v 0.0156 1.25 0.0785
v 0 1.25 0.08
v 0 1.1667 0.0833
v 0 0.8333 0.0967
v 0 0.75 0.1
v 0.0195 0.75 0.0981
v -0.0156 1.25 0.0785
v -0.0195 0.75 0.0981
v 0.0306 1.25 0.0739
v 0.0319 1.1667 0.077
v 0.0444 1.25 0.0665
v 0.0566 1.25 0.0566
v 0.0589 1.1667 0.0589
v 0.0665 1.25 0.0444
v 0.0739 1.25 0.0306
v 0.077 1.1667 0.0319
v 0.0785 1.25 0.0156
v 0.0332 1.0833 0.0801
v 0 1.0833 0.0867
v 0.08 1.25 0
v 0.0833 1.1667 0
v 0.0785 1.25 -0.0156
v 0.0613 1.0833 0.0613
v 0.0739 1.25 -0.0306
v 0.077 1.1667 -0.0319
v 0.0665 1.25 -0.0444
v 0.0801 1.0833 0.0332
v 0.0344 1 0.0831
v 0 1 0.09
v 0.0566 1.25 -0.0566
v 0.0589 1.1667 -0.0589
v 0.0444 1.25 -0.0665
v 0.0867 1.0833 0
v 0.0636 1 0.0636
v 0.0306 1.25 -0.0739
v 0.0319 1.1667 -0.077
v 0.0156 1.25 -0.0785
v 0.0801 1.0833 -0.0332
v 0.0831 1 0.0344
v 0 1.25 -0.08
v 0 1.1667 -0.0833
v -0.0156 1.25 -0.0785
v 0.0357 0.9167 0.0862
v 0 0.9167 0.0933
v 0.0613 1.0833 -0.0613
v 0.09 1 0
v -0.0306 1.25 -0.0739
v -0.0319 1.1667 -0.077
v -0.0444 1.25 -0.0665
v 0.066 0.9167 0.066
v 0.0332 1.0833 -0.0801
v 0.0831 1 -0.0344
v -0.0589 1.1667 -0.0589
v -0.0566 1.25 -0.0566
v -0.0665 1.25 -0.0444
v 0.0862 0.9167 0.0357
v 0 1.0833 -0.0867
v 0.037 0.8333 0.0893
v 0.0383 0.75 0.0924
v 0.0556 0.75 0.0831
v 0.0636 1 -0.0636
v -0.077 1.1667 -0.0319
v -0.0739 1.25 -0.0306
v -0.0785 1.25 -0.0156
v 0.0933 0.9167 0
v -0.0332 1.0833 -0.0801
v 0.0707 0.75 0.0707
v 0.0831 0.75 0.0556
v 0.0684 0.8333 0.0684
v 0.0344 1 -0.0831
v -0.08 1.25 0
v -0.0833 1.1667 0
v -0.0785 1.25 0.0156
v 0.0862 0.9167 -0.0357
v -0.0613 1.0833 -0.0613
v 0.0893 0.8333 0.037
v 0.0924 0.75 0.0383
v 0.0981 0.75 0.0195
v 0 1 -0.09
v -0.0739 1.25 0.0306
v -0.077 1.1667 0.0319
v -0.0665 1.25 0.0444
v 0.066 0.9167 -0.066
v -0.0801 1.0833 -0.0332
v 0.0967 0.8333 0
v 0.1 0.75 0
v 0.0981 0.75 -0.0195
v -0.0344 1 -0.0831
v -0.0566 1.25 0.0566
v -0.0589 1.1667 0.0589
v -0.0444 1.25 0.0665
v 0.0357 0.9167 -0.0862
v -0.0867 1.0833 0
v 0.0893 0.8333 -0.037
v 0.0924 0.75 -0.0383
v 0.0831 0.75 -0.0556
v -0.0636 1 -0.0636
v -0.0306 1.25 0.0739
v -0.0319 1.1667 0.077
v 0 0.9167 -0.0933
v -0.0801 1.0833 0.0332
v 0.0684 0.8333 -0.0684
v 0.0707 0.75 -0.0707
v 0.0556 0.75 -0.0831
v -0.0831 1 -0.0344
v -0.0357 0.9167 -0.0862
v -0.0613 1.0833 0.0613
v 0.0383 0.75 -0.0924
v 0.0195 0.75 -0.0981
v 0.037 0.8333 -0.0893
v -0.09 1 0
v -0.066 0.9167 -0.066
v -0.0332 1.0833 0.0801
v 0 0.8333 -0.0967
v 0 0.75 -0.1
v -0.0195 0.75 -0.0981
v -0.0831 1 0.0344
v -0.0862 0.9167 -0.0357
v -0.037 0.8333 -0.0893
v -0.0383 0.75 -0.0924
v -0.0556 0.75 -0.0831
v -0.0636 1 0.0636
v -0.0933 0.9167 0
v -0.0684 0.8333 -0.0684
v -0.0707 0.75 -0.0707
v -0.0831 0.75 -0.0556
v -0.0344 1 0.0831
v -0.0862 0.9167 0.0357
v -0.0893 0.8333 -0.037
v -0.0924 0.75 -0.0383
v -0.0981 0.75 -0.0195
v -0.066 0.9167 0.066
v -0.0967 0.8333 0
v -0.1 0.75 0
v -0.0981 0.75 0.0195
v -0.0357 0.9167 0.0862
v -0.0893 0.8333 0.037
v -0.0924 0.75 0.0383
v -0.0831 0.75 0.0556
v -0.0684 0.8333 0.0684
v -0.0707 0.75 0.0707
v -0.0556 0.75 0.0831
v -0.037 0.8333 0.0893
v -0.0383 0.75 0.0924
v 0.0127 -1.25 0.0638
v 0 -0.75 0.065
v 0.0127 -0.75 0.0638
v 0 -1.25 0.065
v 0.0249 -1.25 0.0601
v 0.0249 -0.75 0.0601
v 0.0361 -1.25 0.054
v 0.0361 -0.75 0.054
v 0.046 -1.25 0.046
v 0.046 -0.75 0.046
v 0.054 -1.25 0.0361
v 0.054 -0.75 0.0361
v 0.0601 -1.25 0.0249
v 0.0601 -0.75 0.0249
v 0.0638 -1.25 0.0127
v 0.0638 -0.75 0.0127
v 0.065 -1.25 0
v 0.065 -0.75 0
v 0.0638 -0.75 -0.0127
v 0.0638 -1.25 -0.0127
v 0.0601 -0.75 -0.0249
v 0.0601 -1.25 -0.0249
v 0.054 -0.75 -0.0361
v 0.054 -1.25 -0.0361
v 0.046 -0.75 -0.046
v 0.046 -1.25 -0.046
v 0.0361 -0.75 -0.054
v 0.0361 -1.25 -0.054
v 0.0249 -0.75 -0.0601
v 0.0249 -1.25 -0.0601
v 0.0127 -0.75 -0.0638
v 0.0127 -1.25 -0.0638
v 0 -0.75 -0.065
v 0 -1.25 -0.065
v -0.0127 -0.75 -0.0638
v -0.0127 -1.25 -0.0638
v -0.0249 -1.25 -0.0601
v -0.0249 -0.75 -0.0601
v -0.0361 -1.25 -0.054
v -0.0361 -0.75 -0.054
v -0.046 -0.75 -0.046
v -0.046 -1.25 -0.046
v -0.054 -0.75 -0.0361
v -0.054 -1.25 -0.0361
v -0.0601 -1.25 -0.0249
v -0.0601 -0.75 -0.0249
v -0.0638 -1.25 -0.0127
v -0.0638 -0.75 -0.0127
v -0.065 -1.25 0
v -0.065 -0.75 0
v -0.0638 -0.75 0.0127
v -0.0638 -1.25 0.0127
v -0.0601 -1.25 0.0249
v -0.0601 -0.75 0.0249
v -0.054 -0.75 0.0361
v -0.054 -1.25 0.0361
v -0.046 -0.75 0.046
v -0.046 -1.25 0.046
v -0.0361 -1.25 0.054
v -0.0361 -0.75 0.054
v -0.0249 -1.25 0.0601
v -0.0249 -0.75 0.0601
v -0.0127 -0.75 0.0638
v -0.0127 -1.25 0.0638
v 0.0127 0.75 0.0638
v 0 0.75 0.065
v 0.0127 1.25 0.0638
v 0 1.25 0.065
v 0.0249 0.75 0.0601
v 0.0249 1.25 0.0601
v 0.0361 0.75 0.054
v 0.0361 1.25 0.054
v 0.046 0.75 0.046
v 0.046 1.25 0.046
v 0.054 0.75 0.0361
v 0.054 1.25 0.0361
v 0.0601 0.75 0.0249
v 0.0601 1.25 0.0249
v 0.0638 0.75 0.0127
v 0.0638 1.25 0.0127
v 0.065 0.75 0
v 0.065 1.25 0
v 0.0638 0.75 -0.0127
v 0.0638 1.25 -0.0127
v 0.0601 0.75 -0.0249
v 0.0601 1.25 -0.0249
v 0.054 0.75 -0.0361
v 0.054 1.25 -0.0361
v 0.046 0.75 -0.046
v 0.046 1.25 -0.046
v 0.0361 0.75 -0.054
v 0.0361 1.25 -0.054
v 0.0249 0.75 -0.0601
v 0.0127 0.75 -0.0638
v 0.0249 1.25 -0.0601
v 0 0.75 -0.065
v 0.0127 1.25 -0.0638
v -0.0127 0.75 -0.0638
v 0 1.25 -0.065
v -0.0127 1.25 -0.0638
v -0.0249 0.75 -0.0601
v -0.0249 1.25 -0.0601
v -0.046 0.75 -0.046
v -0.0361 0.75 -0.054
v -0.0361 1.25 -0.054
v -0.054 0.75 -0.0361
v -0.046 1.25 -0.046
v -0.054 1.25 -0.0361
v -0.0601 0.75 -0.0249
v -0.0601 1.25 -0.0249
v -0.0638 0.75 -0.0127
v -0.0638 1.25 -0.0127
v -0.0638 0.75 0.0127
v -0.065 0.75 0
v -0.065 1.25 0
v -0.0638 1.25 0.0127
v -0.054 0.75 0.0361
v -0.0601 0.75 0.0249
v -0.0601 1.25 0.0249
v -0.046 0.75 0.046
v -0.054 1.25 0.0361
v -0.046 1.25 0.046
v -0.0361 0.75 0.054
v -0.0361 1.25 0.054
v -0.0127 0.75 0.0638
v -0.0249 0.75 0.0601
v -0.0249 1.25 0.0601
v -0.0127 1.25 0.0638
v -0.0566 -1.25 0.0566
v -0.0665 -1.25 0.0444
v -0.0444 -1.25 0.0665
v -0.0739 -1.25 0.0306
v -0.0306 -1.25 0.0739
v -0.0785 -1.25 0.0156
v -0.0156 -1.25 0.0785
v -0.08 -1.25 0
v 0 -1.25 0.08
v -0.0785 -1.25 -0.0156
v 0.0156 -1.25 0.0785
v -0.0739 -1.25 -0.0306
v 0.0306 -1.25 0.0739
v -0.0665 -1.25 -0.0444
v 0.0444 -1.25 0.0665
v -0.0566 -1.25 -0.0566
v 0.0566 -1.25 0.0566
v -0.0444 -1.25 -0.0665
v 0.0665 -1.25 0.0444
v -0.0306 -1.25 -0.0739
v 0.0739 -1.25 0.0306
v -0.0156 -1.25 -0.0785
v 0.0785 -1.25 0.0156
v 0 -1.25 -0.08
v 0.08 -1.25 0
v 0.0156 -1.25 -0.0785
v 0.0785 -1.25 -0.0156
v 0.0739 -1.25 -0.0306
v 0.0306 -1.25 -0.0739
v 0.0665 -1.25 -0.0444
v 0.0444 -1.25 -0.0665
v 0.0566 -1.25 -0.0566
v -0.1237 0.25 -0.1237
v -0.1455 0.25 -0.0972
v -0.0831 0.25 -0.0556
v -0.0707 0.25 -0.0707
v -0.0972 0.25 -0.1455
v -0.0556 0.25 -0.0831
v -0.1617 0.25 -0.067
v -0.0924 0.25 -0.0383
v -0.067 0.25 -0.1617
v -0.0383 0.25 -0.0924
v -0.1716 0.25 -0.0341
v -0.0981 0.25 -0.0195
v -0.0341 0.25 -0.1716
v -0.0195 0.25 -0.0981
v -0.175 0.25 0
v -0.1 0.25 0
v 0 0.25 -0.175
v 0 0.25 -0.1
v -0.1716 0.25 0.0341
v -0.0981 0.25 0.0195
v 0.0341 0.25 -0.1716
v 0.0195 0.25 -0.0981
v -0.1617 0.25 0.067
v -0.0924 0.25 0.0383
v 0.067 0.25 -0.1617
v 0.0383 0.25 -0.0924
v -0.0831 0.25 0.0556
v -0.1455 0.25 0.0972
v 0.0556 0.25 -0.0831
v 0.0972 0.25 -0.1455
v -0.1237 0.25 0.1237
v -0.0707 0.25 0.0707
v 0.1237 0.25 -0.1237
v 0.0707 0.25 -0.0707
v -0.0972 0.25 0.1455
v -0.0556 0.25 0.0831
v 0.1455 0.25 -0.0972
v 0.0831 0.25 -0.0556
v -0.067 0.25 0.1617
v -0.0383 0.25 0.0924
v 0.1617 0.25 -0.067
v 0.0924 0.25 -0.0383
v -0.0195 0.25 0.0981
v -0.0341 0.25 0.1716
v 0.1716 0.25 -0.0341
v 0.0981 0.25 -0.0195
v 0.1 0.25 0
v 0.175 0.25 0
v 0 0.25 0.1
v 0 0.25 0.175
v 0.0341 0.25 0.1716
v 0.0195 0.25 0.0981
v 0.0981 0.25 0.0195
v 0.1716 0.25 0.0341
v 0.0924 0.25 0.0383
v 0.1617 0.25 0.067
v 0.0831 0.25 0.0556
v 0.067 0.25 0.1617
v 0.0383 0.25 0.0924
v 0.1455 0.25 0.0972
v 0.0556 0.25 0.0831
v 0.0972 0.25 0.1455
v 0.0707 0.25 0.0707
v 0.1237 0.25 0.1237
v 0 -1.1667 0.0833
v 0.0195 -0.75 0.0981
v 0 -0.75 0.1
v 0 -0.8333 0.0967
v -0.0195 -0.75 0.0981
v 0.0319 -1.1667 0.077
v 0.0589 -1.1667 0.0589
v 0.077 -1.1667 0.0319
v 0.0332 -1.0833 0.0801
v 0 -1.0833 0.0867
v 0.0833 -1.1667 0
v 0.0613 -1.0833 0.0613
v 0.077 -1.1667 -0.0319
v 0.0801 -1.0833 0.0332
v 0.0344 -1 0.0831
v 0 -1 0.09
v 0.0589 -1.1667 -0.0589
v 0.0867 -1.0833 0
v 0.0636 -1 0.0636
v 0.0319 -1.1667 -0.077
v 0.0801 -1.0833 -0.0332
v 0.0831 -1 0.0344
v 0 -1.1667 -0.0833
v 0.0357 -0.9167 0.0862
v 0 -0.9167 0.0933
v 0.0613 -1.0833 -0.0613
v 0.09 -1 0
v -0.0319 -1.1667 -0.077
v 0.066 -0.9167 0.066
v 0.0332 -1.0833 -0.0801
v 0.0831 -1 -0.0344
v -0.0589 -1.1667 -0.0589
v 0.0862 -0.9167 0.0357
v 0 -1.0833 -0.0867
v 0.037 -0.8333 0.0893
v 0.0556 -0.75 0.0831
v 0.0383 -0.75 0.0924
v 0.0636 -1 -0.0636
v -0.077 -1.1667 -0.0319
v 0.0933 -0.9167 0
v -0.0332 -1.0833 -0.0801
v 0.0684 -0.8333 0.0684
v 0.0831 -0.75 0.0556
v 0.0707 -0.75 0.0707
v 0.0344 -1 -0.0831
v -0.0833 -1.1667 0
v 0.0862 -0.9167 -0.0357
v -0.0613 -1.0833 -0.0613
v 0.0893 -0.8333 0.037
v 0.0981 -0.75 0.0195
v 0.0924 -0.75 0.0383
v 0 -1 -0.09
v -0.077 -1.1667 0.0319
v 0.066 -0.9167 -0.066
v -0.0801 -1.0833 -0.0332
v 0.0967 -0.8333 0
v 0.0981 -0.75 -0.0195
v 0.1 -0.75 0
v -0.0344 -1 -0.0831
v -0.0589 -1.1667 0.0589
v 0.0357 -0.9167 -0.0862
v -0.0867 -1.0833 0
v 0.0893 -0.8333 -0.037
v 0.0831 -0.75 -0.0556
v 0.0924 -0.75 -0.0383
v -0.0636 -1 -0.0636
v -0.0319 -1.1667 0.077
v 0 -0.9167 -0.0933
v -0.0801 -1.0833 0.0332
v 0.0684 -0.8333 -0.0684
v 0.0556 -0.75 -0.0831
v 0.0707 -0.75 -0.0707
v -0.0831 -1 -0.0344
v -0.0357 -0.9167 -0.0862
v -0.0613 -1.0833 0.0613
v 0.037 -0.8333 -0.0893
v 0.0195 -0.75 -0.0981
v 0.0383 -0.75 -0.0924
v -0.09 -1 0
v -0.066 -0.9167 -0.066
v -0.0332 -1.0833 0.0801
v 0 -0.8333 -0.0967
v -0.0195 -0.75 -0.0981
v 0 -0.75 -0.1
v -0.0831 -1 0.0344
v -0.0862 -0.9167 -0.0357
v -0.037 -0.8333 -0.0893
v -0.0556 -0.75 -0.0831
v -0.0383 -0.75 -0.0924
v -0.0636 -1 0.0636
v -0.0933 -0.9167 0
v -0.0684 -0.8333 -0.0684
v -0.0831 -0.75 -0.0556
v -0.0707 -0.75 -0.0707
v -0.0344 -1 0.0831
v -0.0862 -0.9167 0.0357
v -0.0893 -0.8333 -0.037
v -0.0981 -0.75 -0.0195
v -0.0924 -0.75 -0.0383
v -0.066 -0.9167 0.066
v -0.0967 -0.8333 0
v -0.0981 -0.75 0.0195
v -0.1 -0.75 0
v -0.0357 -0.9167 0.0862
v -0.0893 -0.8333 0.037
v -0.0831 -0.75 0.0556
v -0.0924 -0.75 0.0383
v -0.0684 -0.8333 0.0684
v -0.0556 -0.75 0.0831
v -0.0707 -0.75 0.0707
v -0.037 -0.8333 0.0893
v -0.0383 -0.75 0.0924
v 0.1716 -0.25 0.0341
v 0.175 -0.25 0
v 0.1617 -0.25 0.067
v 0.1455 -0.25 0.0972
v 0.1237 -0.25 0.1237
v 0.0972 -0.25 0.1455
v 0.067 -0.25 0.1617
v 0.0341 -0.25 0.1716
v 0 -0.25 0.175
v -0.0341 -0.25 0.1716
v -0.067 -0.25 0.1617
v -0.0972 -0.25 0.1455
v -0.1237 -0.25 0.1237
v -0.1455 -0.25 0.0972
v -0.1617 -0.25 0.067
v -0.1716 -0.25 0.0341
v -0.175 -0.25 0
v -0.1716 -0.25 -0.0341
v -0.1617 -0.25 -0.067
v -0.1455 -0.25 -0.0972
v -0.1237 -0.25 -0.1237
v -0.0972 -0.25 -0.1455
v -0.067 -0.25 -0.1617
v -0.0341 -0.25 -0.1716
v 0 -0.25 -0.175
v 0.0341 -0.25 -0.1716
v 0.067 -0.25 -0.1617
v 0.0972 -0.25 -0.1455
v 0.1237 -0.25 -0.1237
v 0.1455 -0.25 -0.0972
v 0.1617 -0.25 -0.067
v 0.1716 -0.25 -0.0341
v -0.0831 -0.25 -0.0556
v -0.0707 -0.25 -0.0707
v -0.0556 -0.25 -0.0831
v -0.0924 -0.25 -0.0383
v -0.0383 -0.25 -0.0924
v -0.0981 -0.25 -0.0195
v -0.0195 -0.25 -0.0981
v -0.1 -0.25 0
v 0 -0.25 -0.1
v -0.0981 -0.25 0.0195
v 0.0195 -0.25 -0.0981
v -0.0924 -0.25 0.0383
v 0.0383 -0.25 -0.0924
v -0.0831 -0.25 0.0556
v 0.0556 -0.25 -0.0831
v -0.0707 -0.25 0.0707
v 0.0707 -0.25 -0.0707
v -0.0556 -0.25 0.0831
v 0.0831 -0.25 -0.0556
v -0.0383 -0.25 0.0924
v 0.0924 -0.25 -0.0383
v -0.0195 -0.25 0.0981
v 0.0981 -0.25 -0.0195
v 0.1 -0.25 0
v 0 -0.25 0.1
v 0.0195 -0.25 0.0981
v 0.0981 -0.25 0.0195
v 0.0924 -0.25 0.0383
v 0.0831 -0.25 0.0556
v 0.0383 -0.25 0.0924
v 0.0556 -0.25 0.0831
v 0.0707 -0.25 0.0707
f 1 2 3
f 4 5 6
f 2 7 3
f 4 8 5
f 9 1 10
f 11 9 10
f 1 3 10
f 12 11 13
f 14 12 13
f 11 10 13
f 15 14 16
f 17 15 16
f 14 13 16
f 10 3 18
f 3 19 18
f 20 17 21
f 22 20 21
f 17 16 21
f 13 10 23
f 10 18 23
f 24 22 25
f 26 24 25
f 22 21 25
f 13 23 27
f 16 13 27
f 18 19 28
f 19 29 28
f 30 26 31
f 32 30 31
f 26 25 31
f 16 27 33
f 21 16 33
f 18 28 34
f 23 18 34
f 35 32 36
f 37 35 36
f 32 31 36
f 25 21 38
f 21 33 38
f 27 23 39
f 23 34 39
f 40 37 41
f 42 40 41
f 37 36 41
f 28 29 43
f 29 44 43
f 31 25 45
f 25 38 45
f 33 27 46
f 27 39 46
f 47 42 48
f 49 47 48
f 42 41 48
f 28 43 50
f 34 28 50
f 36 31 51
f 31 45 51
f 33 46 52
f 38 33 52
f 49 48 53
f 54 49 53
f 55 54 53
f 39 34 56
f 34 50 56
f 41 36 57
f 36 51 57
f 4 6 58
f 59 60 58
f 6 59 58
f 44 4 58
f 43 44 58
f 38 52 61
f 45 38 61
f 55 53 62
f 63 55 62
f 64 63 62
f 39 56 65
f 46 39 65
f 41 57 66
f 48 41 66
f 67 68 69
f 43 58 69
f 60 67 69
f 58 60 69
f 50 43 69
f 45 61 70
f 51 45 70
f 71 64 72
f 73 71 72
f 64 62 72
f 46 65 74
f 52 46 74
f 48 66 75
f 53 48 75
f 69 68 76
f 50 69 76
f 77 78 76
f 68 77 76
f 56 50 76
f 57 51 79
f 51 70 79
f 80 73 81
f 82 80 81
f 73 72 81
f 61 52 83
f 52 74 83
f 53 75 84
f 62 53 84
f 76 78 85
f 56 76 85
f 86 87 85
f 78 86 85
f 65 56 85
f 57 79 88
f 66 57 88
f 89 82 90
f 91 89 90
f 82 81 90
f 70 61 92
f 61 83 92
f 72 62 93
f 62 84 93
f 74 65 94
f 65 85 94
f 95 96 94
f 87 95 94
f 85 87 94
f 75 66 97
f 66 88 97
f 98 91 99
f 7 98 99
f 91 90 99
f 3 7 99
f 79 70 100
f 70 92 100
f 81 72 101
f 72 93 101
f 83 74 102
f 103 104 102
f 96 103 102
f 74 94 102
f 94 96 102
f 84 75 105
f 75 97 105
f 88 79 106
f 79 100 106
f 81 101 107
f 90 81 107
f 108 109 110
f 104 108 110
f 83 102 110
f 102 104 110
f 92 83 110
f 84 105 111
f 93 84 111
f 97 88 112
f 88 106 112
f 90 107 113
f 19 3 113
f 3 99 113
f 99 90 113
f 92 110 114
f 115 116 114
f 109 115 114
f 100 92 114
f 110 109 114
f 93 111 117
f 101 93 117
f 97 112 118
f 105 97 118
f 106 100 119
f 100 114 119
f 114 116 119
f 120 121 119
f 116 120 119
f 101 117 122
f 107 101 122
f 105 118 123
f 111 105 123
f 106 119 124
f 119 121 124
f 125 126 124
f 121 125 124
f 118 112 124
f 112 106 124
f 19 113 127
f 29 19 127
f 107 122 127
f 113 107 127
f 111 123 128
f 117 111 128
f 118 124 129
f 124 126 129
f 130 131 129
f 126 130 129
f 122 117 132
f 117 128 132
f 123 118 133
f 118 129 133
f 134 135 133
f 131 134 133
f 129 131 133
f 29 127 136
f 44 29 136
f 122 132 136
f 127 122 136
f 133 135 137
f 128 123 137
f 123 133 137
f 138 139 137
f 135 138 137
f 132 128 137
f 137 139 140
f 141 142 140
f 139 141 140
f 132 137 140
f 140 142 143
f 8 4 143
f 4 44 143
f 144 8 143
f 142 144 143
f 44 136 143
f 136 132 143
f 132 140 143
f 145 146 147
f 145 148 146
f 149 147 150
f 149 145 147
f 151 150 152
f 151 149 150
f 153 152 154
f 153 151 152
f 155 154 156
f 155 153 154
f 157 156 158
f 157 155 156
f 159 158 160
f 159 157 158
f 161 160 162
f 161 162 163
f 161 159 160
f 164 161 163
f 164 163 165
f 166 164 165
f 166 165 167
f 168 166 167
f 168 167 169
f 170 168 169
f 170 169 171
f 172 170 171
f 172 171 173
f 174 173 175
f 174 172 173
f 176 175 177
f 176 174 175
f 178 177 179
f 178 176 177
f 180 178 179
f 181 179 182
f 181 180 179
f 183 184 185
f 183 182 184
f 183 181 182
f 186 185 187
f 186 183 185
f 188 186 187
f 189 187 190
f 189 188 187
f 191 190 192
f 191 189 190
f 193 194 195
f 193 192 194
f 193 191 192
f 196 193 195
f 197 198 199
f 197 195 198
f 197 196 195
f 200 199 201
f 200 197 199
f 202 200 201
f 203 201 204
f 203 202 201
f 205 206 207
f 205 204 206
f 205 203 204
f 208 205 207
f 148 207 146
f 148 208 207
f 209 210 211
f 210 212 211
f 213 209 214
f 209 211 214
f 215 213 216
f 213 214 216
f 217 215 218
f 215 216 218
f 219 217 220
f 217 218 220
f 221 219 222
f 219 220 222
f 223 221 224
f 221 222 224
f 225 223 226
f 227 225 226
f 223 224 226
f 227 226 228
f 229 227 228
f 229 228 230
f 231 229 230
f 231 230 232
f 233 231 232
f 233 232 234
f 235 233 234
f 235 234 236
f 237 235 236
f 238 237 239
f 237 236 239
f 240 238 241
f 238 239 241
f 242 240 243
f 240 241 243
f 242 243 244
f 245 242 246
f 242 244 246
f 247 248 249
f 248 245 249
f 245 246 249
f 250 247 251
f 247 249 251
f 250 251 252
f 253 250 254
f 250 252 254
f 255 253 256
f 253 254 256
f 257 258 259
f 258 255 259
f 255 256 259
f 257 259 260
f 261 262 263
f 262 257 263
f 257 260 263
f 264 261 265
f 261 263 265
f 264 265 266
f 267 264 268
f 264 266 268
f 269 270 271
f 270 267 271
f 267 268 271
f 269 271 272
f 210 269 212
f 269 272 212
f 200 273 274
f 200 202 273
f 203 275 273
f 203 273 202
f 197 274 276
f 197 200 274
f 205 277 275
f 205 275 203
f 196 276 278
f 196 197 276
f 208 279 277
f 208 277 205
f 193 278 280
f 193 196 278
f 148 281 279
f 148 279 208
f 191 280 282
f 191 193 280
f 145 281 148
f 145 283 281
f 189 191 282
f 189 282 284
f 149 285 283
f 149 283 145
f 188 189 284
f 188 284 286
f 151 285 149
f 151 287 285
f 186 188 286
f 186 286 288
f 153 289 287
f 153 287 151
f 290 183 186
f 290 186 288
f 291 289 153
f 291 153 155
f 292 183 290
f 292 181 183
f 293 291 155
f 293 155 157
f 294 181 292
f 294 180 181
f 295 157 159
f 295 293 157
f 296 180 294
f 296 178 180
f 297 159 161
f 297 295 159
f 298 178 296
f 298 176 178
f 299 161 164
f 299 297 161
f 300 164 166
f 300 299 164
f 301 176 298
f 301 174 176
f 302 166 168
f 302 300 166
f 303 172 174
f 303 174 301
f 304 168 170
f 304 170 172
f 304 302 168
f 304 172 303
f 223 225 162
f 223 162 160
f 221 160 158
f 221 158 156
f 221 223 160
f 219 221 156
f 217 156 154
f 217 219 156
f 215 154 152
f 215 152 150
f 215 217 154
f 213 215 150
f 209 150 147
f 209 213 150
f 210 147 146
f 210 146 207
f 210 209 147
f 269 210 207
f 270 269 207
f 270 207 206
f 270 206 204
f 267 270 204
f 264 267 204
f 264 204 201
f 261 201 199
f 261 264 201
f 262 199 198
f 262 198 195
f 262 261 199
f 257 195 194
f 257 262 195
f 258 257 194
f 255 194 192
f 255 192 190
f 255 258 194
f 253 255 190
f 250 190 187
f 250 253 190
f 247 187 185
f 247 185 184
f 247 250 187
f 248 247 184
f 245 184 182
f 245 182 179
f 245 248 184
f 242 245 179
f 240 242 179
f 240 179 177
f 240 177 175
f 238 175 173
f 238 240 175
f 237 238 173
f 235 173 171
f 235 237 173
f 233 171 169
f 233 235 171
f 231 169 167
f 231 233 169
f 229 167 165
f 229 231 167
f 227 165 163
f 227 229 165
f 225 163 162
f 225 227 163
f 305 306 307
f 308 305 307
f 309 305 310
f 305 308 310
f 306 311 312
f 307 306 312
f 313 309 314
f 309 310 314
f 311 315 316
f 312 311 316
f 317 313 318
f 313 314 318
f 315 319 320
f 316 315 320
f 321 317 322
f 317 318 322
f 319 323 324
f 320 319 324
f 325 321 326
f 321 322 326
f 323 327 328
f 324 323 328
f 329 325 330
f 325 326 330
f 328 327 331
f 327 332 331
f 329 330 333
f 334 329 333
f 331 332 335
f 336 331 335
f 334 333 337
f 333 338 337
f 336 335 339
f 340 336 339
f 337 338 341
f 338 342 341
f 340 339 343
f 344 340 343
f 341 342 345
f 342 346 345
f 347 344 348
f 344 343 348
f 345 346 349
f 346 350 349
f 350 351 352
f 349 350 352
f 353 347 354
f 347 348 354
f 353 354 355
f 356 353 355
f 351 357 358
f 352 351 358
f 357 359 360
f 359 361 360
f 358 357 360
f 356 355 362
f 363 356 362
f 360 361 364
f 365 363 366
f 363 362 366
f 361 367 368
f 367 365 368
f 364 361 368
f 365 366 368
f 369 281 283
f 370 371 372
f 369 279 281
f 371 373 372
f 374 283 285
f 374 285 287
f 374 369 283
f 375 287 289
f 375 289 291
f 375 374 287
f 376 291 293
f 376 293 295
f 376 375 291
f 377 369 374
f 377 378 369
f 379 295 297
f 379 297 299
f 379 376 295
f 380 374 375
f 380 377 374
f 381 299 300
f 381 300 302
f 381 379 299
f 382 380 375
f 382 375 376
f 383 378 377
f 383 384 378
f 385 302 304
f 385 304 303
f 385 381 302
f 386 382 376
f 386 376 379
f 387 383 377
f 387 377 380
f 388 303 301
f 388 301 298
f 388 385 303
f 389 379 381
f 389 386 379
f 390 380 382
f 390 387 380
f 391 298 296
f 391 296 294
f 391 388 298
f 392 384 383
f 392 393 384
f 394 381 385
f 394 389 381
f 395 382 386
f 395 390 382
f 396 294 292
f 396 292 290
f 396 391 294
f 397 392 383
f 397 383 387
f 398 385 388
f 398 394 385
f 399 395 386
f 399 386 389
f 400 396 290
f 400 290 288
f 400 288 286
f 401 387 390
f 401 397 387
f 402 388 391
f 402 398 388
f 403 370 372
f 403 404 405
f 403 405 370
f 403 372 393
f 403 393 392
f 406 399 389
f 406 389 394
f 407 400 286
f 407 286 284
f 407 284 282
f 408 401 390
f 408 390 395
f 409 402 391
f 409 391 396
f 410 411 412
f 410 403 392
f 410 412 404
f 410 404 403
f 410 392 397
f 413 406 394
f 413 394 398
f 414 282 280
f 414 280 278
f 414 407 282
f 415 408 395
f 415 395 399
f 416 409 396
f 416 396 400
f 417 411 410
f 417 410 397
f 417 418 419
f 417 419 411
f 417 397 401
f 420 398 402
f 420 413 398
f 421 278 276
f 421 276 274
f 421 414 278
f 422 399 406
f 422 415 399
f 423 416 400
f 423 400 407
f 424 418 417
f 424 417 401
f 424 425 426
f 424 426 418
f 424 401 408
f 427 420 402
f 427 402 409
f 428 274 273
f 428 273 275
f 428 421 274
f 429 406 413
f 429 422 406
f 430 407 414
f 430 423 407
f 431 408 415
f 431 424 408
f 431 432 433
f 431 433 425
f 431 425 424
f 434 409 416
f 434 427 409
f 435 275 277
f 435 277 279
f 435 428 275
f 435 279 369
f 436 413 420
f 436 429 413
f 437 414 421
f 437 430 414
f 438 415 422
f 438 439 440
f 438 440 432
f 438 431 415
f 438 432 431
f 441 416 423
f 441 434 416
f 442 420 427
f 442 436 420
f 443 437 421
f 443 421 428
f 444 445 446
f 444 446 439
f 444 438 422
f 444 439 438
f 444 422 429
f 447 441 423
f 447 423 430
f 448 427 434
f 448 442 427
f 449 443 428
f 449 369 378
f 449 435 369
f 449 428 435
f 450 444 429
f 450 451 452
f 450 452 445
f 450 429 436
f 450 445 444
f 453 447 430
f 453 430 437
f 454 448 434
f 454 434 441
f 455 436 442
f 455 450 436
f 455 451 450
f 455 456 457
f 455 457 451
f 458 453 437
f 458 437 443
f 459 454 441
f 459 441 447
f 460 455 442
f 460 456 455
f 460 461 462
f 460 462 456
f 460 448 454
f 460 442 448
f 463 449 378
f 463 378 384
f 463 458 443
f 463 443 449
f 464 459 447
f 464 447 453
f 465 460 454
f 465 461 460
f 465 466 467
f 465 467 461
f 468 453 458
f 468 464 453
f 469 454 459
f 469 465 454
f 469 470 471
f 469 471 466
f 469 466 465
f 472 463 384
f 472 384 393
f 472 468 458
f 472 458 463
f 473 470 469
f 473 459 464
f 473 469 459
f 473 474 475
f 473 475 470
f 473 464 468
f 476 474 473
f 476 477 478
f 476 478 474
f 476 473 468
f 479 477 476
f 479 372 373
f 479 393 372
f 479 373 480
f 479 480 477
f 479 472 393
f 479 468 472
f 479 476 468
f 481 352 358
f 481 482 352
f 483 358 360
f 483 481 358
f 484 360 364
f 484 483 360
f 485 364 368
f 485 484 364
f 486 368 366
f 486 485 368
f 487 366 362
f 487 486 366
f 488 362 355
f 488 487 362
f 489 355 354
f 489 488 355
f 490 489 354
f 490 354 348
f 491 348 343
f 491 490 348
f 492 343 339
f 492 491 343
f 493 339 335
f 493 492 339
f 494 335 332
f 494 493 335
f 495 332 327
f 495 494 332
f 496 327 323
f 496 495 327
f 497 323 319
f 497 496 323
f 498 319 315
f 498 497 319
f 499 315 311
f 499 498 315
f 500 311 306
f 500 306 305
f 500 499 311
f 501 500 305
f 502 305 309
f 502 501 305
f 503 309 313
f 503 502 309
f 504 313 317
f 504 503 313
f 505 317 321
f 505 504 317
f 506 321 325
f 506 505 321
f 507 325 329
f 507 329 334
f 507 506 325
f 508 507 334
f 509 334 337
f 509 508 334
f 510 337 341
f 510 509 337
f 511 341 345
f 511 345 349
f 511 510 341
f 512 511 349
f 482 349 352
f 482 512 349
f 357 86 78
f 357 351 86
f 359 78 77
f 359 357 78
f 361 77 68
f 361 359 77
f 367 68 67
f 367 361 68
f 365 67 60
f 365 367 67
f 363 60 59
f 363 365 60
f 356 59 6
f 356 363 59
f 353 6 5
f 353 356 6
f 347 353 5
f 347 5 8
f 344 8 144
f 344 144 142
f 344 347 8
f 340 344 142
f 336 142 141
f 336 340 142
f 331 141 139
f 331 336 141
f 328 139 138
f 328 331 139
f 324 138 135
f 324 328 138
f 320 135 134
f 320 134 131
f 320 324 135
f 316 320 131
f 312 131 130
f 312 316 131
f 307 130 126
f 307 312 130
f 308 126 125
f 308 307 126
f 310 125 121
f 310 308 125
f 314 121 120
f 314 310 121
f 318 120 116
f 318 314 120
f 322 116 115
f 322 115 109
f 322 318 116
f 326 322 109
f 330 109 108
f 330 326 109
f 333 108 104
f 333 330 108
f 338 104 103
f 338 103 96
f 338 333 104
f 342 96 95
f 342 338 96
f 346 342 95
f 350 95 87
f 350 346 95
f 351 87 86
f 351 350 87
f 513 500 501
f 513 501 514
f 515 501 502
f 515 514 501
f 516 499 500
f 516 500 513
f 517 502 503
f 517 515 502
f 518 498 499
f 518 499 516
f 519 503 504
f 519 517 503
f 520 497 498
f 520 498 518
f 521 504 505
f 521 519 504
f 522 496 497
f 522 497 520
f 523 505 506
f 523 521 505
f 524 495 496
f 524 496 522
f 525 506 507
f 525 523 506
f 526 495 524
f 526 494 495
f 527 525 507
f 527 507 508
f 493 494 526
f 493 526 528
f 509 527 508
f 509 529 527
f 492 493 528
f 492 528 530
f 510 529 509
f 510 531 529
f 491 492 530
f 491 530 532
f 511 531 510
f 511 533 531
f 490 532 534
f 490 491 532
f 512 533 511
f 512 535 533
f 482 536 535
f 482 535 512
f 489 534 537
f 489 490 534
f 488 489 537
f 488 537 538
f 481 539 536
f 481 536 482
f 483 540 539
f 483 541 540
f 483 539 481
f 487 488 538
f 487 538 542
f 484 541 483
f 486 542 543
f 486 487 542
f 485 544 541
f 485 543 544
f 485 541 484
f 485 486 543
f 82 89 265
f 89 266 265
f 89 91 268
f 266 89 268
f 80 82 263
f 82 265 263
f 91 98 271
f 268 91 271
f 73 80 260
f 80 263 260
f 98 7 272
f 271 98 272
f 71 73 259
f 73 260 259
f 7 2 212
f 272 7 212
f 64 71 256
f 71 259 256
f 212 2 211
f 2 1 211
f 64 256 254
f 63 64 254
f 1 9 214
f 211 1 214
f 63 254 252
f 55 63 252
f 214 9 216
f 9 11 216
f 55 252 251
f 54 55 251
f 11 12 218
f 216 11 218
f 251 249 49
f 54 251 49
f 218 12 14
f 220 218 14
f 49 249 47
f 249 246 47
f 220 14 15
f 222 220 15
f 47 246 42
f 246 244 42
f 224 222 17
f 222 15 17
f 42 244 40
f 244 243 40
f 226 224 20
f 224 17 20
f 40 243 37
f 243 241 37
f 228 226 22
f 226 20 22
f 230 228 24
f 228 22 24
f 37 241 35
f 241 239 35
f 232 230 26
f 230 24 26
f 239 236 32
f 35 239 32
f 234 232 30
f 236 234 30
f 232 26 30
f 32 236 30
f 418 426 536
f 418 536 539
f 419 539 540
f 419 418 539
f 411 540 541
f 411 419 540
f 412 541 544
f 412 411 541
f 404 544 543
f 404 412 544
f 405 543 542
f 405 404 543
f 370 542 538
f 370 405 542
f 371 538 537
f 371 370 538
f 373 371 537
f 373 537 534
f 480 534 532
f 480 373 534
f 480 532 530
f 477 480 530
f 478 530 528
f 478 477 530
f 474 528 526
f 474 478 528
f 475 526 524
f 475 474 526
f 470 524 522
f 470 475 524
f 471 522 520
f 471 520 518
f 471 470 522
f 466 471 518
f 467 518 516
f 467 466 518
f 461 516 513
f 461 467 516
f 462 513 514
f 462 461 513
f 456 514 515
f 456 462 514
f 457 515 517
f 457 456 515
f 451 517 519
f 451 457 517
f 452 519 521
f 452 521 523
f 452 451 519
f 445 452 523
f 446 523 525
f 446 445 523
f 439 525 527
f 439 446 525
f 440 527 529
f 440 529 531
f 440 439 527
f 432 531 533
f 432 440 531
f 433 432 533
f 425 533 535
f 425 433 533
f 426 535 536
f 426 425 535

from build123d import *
from build123d import SkipClean  # not in build123d's __all__

# Parameters (mm, degrees)
F0_R     = 0.175
F0_R_2   = 0.1
F0_R_3   = 0.065
F1_DEPTH = 0.25
F2_DEPTH = 0.75


with BuildPart() as f1:
    # F0 (on Front) → F1 (new body, symmetric)
    with BuildSketch(Plane.XZ):
        Circle(F0_R)
        Circle(F0_R_2, mode=Mode.SUBTRACT)
        Circle(F0_R_2)
        Circle(F0_R_3, mode=Mode.SUBTRACT)
    extrude(amount=F1_DEPTH, both=True)

    # F0 (on Front) → F2 (join, symmetric)
    with BuildSketch(Plane.XZ):
        Circle(F0_R_2)
        Circle(F0_R_3, mode=Mode.SUBTRACT)
    extrude(amount=F2_DEPTH, both=True)

    # F3 (on Right) → F4 (revolve)
    with BuildSketch(Plane.YZ):
        Polygon((0.75, 0.065), (1.25, 0.065), (1.25, 0.08), (0.75, 0.1), align=None)
    with SkipClean():  # cleaning this boolean's faces spoils the solid; the shape is the same uncleaned
        revolve(axis=Axis((0, 0.625, 0), (0, 1, 0)))

    # F5: F1 across plane


with BuildPart() as f1_1:
    add(f1.part, clean=False)
    with SkipClean():  # cleaning this boolean's faces spoils the solid; the shape is the same uncleaned
        add(f1.part.mirror(Plane.XZ), clean=False)


solid = f1_1.part
